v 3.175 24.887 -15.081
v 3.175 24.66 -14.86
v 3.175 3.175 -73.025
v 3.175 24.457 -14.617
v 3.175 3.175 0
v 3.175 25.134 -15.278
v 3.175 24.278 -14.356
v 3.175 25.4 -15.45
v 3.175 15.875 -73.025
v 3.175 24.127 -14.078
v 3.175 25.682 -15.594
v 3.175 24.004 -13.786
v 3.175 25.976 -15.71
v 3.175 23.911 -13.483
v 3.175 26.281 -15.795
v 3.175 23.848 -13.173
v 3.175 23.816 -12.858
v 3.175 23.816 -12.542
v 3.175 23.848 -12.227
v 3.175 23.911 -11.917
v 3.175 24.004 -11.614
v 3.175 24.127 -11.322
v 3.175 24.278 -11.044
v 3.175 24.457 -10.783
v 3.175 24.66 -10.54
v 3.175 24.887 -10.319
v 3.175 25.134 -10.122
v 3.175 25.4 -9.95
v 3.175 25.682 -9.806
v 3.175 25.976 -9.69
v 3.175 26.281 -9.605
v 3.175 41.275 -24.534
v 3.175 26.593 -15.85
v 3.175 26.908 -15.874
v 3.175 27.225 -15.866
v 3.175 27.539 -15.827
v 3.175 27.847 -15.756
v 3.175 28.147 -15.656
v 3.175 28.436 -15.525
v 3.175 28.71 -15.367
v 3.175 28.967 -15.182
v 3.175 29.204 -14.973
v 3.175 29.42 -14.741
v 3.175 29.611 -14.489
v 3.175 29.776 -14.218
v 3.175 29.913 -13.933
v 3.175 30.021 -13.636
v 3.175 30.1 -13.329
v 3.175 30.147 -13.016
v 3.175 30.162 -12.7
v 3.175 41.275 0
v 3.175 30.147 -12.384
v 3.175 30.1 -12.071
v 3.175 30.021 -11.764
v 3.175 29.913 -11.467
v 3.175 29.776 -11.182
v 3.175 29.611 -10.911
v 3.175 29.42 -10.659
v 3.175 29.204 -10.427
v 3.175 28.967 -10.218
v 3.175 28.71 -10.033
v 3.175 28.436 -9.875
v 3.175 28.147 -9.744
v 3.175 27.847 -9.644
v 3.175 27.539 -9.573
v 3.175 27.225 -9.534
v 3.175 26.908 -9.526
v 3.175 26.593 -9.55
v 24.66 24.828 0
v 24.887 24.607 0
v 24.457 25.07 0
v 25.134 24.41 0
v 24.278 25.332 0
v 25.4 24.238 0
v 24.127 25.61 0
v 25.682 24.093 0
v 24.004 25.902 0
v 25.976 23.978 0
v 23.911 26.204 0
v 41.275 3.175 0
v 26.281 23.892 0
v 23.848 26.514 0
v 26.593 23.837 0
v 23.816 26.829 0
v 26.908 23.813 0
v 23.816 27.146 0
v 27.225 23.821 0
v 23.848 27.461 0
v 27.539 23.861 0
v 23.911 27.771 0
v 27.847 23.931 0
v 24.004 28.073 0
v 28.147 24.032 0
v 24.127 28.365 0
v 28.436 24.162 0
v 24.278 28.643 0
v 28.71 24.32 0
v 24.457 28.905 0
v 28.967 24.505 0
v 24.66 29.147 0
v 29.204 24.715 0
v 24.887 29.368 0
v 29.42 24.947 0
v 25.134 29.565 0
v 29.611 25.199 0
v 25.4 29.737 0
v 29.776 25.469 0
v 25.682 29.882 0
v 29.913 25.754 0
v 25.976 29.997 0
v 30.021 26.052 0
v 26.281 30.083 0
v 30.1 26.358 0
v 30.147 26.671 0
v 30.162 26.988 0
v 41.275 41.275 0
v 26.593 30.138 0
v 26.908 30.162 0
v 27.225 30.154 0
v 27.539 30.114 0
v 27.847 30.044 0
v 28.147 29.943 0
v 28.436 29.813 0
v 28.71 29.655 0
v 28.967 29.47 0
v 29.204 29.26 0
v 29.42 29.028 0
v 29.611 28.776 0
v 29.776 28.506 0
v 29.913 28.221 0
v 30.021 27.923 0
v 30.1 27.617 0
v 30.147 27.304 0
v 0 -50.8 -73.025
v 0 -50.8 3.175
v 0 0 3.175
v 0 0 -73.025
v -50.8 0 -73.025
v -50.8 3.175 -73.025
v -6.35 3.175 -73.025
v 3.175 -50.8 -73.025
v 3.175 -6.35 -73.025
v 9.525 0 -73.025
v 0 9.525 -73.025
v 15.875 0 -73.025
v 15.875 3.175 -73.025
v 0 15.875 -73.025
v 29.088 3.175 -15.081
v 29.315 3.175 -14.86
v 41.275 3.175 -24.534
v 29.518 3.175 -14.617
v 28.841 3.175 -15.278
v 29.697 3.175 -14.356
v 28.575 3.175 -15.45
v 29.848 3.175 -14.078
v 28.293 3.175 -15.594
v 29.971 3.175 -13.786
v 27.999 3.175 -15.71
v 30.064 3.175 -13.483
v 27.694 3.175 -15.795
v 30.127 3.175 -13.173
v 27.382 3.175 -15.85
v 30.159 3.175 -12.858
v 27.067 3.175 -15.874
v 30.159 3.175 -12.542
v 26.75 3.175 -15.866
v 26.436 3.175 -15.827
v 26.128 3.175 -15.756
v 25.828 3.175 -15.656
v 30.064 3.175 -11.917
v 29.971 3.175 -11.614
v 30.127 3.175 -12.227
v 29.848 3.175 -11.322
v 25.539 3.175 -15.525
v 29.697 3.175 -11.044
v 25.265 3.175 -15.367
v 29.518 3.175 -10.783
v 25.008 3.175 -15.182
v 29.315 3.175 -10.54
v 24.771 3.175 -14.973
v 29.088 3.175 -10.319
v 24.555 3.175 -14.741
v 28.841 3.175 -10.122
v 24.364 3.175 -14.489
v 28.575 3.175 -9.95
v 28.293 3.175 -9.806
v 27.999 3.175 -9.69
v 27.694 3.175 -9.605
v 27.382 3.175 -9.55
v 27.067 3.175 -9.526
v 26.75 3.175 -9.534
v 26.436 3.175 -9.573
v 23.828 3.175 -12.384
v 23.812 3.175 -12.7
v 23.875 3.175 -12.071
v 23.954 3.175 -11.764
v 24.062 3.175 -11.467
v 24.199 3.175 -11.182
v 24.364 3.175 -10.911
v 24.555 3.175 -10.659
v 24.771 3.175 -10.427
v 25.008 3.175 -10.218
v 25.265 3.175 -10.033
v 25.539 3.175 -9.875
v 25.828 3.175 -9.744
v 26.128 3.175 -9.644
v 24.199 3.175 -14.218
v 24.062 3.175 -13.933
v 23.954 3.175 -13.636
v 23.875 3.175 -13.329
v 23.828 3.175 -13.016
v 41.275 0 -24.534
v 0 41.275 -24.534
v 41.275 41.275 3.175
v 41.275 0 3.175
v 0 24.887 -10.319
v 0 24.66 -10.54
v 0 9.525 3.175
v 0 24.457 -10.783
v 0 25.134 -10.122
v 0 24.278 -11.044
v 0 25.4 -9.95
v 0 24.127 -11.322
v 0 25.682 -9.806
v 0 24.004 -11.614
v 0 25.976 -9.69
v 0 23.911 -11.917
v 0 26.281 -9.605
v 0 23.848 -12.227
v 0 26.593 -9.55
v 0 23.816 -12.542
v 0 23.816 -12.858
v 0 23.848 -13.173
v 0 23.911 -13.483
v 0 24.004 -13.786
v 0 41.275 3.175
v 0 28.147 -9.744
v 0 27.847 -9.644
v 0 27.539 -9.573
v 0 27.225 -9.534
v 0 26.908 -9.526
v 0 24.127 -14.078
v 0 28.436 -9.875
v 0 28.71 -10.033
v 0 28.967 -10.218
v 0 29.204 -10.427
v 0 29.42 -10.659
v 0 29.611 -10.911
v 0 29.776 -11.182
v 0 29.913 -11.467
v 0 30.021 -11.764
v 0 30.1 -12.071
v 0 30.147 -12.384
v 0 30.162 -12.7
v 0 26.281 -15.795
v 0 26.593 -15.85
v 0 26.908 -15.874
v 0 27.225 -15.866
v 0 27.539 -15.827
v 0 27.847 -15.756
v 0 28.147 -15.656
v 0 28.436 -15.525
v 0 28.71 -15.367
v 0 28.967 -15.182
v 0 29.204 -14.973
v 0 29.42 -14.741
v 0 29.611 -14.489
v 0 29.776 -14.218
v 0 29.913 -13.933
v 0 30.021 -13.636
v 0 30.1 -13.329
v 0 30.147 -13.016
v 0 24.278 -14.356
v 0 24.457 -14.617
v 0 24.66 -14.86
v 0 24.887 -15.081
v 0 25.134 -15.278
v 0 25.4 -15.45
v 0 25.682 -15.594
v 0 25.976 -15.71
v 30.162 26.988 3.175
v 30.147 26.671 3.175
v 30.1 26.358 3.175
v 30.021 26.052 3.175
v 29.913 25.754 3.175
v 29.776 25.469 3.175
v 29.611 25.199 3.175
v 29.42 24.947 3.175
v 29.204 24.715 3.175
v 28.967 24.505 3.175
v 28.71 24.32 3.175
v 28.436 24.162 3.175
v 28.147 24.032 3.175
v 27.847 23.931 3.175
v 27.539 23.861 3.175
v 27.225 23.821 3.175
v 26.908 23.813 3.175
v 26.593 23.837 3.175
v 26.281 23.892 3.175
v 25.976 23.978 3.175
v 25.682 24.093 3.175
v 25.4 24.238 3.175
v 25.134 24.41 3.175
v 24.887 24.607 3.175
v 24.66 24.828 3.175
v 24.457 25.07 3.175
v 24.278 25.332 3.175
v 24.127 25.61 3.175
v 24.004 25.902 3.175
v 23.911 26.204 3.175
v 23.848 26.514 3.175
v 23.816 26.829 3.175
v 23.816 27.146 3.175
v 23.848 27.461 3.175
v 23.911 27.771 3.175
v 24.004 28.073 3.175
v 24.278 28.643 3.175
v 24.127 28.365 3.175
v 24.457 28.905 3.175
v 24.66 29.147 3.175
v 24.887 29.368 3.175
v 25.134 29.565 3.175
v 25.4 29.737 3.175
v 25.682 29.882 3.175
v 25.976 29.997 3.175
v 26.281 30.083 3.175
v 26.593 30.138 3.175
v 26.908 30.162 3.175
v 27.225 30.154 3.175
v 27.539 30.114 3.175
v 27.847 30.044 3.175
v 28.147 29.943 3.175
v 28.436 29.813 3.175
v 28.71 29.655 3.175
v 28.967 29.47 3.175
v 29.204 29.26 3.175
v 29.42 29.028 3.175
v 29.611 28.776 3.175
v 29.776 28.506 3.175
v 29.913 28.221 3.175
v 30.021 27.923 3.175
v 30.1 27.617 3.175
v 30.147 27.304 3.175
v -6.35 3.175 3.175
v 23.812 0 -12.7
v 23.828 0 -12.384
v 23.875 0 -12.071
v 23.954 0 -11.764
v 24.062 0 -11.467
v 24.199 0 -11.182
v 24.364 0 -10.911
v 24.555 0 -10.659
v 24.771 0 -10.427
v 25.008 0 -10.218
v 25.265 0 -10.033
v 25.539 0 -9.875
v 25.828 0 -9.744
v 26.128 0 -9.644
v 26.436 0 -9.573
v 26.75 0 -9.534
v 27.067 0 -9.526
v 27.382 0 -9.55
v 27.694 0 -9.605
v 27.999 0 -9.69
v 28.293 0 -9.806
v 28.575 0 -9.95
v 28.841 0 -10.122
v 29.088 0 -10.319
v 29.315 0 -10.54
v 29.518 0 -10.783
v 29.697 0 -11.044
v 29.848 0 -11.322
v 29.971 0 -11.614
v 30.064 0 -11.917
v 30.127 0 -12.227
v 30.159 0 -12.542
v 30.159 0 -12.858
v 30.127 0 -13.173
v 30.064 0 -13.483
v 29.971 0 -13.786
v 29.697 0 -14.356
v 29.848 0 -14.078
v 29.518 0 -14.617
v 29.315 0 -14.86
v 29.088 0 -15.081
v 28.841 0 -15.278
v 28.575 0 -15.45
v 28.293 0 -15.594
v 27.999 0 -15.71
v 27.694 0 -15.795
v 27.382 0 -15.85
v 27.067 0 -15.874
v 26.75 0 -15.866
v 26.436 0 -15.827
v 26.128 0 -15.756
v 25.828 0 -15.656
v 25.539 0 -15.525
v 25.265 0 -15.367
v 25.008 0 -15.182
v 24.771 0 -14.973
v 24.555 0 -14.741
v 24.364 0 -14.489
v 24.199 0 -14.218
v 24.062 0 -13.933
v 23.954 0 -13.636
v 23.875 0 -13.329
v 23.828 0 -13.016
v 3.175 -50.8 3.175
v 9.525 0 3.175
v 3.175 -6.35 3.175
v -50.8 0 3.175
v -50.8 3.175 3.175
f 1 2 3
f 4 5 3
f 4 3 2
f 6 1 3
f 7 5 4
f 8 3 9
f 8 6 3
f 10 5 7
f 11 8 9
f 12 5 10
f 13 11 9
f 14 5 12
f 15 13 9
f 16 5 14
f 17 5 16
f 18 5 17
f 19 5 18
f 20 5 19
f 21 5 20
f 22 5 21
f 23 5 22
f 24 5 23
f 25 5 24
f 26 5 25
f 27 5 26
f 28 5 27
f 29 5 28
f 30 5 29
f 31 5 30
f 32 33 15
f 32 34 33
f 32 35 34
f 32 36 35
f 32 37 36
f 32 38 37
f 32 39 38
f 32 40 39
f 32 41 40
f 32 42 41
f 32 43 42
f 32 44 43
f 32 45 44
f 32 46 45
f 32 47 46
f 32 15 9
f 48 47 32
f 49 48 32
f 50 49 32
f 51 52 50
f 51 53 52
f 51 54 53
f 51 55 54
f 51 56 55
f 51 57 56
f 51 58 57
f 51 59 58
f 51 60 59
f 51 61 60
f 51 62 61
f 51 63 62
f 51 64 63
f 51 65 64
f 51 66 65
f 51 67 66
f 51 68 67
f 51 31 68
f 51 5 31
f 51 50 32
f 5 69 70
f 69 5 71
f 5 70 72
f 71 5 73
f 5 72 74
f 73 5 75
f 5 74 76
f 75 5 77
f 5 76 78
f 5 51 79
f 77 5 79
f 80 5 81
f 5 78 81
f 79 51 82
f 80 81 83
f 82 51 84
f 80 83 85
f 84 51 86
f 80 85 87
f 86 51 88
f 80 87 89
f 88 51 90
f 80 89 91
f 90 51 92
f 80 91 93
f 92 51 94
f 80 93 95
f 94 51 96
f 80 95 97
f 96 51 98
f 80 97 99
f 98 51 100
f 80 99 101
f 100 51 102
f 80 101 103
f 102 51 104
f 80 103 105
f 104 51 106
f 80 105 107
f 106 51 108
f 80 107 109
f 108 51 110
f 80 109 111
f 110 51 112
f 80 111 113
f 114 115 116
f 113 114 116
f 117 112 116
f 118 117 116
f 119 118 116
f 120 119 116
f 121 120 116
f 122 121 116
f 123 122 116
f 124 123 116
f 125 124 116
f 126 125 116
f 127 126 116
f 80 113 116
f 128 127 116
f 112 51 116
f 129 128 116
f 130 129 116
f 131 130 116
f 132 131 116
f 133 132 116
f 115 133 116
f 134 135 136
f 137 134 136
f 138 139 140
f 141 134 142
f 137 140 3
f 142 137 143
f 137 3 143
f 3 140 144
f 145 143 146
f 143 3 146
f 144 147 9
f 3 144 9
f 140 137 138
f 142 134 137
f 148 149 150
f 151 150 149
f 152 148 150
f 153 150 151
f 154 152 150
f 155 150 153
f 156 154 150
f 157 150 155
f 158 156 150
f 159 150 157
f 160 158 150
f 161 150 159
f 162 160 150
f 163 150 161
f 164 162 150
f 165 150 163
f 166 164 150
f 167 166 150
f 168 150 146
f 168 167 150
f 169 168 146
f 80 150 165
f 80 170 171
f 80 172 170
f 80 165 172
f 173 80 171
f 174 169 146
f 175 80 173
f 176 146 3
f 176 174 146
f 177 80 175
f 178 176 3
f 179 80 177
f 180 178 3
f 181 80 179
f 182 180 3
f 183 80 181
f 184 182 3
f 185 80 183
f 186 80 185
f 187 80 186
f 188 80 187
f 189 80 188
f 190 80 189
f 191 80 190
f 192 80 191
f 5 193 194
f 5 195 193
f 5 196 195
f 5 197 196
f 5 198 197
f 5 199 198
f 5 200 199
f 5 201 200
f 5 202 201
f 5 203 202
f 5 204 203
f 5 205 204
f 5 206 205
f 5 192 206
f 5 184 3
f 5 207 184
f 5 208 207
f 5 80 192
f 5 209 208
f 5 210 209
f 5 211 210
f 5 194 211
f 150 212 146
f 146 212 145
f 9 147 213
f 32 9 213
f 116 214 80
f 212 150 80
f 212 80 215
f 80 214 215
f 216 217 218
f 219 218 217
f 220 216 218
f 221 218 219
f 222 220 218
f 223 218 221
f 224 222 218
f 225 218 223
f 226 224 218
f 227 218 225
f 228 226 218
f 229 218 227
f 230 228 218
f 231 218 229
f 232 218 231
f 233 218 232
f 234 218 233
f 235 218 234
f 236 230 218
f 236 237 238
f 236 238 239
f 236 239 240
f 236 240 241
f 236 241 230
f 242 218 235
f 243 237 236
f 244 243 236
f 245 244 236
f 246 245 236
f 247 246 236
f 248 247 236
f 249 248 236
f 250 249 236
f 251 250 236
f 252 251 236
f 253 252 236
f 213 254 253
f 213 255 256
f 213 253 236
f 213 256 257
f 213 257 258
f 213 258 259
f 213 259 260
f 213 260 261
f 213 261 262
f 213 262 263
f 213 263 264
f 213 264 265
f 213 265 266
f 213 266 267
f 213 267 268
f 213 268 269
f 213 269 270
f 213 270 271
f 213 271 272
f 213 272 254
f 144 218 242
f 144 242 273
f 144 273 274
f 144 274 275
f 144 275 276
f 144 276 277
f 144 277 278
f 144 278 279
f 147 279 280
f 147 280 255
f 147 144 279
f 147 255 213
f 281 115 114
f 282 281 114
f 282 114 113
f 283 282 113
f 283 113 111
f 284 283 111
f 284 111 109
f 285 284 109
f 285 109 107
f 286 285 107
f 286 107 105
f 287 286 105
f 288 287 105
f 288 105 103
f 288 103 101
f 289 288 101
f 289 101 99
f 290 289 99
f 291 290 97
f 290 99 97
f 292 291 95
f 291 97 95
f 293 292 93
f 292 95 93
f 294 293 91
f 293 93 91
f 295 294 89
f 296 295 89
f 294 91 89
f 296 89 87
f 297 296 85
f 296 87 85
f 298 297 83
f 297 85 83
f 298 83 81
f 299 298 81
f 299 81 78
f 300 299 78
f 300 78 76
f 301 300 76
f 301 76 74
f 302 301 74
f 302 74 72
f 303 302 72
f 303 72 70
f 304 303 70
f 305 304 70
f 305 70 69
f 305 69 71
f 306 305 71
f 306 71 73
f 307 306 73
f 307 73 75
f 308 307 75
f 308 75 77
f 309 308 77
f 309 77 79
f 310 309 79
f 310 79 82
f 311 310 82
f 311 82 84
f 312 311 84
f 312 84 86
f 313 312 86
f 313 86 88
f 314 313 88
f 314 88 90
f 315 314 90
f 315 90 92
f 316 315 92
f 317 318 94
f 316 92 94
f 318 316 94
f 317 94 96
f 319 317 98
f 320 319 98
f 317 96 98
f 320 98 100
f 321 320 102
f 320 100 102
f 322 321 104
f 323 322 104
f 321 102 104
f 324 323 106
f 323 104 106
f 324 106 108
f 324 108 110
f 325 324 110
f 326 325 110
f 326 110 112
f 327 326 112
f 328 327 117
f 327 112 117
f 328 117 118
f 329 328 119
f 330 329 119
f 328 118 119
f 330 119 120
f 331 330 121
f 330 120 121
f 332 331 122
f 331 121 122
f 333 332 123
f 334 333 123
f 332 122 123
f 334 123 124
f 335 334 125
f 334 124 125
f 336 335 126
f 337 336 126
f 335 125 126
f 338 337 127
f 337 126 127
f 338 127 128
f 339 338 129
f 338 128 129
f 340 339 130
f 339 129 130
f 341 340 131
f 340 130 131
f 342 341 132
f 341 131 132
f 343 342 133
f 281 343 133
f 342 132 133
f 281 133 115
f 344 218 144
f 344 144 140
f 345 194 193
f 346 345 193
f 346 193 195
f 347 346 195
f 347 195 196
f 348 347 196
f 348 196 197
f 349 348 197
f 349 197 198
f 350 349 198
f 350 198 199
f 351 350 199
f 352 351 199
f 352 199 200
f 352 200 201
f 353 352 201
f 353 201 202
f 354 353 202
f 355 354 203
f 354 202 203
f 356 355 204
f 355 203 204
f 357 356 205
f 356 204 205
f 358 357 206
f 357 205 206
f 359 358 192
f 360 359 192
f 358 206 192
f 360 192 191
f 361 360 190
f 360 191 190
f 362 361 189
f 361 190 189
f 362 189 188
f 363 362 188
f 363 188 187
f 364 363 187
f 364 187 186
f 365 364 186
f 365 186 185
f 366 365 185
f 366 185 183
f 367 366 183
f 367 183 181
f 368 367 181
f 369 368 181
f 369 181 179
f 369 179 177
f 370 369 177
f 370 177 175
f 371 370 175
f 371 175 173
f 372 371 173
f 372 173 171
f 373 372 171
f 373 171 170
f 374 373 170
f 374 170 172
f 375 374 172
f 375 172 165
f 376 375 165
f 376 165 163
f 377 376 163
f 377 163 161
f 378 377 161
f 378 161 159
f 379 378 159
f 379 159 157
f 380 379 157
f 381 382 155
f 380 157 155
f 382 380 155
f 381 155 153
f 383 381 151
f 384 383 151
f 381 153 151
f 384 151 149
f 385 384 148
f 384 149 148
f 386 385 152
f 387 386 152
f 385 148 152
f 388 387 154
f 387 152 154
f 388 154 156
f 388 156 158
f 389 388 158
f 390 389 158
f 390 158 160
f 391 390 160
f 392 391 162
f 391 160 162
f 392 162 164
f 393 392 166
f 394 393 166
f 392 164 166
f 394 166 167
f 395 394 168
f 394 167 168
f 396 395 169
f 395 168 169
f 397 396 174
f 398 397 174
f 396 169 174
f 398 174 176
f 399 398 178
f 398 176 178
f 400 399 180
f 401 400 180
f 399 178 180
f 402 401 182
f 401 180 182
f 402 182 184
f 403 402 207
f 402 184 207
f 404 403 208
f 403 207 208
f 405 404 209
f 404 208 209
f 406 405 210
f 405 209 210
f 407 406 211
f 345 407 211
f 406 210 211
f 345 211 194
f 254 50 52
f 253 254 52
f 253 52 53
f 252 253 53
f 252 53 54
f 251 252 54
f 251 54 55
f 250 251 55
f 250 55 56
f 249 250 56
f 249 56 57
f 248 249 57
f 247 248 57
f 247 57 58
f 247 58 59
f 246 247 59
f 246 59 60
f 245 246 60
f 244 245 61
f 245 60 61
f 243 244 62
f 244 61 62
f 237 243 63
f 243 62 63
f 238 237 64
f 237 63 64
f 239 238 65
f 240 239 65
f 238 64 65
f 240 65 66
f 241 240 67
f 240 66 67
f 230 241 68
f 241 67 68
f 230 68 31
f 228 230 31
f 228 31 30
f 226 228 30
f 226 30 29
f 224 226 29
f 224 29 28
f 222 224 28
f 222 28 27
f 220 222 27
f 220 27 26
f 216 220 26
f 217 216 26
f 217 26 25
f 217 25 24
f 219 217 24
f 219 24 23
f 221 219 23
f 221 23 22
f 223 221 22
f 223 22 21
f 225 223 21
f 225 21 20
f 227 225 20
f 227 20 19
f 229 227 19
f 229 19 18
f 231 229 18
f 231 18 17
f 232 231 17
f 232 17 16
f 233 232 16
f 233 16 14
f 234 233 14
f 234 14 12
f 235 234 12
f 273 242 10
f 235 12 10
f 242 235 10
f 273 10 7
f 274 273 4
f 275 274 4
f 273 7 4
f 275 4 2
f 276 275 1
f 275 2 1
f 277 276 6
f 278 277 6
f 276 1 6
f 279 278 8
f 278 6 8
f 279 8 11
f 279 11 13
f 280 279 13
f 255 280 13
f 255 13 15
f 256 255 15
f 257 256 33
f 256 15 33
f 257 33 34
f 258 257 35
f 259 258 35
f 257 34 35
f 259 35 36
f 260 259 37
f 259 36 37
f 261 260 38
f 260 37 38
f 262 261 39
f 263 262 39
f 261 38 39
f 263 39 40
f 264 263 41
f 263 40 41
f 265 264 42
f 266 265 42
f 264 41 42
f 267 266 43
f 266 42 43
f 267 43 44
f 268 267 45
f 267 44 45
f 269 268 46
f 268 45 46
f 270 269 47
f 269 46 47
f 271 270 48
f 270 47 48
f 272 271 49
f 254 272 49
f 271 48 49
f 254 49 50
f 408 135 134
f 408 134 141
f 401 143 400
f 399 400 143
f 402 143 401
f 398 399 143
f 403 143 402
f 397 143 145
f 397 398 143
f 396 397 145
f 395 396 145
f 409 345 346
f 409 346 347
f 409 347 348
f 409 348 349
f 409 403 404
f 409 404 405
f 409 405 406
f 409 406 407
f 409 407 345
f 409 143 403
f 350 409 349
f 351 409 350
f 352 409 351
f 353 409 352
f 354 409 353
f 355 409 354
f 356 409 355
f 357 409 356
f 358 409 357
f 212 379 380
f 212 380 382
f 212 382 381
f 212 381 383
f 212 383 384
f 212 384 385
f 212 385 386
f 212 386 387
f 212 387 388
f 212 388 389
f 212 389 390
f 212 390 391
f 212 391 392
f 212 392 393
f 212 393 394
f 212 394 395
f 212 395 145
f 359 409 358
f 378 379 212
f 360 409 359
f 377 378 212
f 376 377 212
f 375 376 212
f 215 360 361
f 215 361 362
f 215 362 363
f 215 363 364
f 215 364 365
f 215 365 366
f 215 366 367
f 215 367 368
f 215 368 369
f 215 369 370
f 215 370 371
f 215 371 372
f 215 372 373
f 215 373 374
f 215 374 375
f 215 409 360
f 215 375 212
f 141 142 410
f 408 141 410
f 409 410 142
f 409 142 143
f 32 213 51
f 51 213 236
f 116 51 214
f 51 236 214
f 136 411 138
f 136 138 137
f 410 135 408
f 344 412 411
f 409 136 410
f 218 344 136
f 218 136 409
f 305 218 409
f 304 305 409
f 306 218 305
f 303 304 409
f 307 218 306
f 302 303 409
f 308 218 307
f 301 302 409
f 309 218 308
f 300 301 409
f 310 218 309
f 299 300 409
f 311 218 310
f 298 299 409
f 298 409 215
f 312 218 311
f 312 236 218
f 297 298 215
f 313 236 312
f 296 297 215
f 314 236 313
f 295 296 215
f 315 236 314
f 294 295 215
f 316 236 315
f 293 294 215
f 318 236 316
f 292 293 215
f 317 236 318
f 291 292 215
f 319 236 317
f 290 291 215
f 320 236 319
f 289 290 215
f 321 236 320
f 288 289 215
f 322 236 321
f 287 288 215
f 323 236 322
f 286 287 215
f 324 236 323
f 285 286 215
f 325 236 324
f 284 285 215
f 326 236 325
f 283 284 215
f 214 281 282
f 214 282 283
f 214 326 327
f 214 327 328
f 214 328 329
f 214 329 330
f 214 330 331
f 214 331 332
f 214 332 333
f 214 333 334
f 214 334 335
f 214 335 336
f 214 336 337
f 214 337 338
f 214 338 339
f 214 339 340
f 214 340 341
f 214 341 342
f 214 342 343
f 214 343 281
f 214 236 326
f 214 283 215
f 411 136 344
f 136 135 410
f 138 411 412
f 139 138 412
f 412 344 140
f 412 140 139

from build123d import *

# Parameters (mm, degrees)
F0_W          = 50.8
F0_H          = 50.8
F1_DEPTH      = 3.175
F2_W          = 50.8
F2_H          = 3.175
F3_DEPTH      = 12.7
F3_DEPTH_BACK = 76.2
F4_W          = 3.175
F4_H          = 101.6
F5_DEPTH      = 12.7
F5_DEPTH_BACK = 76.2
F7_W          = 47.625
F7_H          = 12.7
F8_DEPTH      = 25.4
F9_W          = 47.625
F9_H          = 12.7
F10_DEPTH     = 25.4
F12_DEPTH     = 25.4
F14_DEPTH     = 25.4
F16_DEPTH     = 53.976
F18_DEPTH     = 76.2
F19_R         = 3.175
F20_DEPTH     = 25.4
F21_R         = 3.175
F22_DEPTH     = 25.4
F23_R         = 3.175
F24_DEPTH     = 25.4
F26_DEPTH     = 76.201


with BuildPart() as f1:
    # F0 (on Top) → F1 (new body)
    with BuildSketch(Plane.XY):
        with Locations((25.4, 25.4)):
            Rectangle(F0_W, F0_H)
    extrude(amount=F1_DEPTH)

    # F2 (on face) → F3 (join, two sides)
    with BuildSketch(Plane.XY.offset(3.175)) as f3_sk:
        with Locations((-25.4, 1.5875)):
            Rectangle(F2_W, F2_H)
        with Locations((25.4, 1.5875)):
            Rectangle(F2_W, F2_H)
    extrude(amount=F3_DEPTH)
    extrude(f3_sk.sketch, amount=-F3_DEPTH_BACK)

    # F4 (on face) → F5 (join, two sides)
    with BuildSketch(Plane.XY.offset(3.175)) as f5_sk:
        with Locations((1.5875, 0)):
            Rectangle(F4_W, F4_H)
    extrude(amount=F5_DEPTH)
    extrude(f5_sk.sketch, amount=-F5_DEPTH_BACK)

    # F7 (on face) → F8 (cut)
    with BuildSketch(Plane.YZ.offset(3.175)):
        with Locations((26.9875, 9.525)):
            Rectangle(F7_W, F7_H)
    extrude(amount=-F8_DEPTH, mode=Mode.SUBTRACT)

    # F9 (on face) → F10 (cut)
    with BuildSketch(Plane(origin=(0, 3.175, 0), x_dir=(-1, 0, 0), z_dir=(0, 1, 0))):
        with Locations((-26.9875, 9.525)):
            Rectangle(F9_W, F9_H)
    extrude(amount=-F10_DEPTH, mode=Mode.SUBTRACT)

    # F11 (on face) → F12 (cut)
    with BuildSketch(Plane.XZ):
        Polygon((50.8, -6.35), (15.875, -73.025), (50.8, -73.025), align=None)
    extrude(amount=-F12_DEPTH, mode=Mode.SUBTRACT)

    # F13 (on face) → F14 (cut)
    with BuildSketch(Plane(origin=(0, 0, 0), x_dir=(0, -1, 0), z_dir=(-1, 0, 0))):
        Polygon((-15.875, -73.025), (-50.8, -6.35), (-50.8, -73.025), align=None)
    extrude(amount=-F14_DEPTH, mode=Mode.SUBTRACT)

    # F15 (on face) → F16 (cut, through all)
    with BuildSketch(Plane(origin=(0, 3.175, 0), x_dir=(-1, 0, 0), z_dir=(0, 1, 0))):
        Polygon((50.8, 15.875), (-3.175, 15.875), (-3.175, 3.175), (0, 3.175), (50.8, 3.175), align=None)
    extrude(amount=-F16_DEPTH, mode=Mode.SUBTRACT)

    # F17 (on face) → F18 (join, through all)
    with BuildSketch(Plane.XY.offset(3.175)):
        Polygon((9.525, 0), (3.175, 0), (3.175, -6.35), align=None)
        Polygon((-6.35, 3.175), (0, 3.175), (0, 9.525), align=None)
    extrude(amount=-F18_DEPTH)

    # F19 (on face) → F20 (cut)
    with BuildSketch(Plane(origin=(0, 3.175, 0), x_dir=(-1, 0, 0), z_dir=(0, 1, 0))):
        with Locations((-26.9875, -12.7)):
            Circle(F19_R)
    extrude(amount=-F20_DEPTH, mode=Mode.SUBTRACT)

    # F21 (on face) → F22 (cut)
    with BuildSketch(Plane.YZ.offset(3.175)):
        with Locations((26.9875, -12.7)):
            Circle(F21_R)
    extrude(amount=-F22_DEPTH, mode=Mode.SUBTRACT)

    # F23 (on face) → F24 (cut)
    with BuildSketch(Plane(origin=(0, 0, 0), x_dir=(1, 0, 0), z_dir=(0, 0, -1))):
        with Locations((26.9875, -26.9875)):
            Circle(F23_R)
    extrude(amount=-F24_DEPTH, mode=Mode.SUBTRACT)

    # F25 (on face) → F26 (cut, through all)
    with BuildSketch(Plane.XY.offset(3.175)):
        Polygon((41.275, 0), (50.8, 0), (50.8, 50.8), (41.275, 50.8), (0, 50.8), (0, 41.275), (41.275, 41.275), align=None)
    extrude(amount=-F26_DEPTH, mode=Mode.SUBTRACT)


solid = f1.part
